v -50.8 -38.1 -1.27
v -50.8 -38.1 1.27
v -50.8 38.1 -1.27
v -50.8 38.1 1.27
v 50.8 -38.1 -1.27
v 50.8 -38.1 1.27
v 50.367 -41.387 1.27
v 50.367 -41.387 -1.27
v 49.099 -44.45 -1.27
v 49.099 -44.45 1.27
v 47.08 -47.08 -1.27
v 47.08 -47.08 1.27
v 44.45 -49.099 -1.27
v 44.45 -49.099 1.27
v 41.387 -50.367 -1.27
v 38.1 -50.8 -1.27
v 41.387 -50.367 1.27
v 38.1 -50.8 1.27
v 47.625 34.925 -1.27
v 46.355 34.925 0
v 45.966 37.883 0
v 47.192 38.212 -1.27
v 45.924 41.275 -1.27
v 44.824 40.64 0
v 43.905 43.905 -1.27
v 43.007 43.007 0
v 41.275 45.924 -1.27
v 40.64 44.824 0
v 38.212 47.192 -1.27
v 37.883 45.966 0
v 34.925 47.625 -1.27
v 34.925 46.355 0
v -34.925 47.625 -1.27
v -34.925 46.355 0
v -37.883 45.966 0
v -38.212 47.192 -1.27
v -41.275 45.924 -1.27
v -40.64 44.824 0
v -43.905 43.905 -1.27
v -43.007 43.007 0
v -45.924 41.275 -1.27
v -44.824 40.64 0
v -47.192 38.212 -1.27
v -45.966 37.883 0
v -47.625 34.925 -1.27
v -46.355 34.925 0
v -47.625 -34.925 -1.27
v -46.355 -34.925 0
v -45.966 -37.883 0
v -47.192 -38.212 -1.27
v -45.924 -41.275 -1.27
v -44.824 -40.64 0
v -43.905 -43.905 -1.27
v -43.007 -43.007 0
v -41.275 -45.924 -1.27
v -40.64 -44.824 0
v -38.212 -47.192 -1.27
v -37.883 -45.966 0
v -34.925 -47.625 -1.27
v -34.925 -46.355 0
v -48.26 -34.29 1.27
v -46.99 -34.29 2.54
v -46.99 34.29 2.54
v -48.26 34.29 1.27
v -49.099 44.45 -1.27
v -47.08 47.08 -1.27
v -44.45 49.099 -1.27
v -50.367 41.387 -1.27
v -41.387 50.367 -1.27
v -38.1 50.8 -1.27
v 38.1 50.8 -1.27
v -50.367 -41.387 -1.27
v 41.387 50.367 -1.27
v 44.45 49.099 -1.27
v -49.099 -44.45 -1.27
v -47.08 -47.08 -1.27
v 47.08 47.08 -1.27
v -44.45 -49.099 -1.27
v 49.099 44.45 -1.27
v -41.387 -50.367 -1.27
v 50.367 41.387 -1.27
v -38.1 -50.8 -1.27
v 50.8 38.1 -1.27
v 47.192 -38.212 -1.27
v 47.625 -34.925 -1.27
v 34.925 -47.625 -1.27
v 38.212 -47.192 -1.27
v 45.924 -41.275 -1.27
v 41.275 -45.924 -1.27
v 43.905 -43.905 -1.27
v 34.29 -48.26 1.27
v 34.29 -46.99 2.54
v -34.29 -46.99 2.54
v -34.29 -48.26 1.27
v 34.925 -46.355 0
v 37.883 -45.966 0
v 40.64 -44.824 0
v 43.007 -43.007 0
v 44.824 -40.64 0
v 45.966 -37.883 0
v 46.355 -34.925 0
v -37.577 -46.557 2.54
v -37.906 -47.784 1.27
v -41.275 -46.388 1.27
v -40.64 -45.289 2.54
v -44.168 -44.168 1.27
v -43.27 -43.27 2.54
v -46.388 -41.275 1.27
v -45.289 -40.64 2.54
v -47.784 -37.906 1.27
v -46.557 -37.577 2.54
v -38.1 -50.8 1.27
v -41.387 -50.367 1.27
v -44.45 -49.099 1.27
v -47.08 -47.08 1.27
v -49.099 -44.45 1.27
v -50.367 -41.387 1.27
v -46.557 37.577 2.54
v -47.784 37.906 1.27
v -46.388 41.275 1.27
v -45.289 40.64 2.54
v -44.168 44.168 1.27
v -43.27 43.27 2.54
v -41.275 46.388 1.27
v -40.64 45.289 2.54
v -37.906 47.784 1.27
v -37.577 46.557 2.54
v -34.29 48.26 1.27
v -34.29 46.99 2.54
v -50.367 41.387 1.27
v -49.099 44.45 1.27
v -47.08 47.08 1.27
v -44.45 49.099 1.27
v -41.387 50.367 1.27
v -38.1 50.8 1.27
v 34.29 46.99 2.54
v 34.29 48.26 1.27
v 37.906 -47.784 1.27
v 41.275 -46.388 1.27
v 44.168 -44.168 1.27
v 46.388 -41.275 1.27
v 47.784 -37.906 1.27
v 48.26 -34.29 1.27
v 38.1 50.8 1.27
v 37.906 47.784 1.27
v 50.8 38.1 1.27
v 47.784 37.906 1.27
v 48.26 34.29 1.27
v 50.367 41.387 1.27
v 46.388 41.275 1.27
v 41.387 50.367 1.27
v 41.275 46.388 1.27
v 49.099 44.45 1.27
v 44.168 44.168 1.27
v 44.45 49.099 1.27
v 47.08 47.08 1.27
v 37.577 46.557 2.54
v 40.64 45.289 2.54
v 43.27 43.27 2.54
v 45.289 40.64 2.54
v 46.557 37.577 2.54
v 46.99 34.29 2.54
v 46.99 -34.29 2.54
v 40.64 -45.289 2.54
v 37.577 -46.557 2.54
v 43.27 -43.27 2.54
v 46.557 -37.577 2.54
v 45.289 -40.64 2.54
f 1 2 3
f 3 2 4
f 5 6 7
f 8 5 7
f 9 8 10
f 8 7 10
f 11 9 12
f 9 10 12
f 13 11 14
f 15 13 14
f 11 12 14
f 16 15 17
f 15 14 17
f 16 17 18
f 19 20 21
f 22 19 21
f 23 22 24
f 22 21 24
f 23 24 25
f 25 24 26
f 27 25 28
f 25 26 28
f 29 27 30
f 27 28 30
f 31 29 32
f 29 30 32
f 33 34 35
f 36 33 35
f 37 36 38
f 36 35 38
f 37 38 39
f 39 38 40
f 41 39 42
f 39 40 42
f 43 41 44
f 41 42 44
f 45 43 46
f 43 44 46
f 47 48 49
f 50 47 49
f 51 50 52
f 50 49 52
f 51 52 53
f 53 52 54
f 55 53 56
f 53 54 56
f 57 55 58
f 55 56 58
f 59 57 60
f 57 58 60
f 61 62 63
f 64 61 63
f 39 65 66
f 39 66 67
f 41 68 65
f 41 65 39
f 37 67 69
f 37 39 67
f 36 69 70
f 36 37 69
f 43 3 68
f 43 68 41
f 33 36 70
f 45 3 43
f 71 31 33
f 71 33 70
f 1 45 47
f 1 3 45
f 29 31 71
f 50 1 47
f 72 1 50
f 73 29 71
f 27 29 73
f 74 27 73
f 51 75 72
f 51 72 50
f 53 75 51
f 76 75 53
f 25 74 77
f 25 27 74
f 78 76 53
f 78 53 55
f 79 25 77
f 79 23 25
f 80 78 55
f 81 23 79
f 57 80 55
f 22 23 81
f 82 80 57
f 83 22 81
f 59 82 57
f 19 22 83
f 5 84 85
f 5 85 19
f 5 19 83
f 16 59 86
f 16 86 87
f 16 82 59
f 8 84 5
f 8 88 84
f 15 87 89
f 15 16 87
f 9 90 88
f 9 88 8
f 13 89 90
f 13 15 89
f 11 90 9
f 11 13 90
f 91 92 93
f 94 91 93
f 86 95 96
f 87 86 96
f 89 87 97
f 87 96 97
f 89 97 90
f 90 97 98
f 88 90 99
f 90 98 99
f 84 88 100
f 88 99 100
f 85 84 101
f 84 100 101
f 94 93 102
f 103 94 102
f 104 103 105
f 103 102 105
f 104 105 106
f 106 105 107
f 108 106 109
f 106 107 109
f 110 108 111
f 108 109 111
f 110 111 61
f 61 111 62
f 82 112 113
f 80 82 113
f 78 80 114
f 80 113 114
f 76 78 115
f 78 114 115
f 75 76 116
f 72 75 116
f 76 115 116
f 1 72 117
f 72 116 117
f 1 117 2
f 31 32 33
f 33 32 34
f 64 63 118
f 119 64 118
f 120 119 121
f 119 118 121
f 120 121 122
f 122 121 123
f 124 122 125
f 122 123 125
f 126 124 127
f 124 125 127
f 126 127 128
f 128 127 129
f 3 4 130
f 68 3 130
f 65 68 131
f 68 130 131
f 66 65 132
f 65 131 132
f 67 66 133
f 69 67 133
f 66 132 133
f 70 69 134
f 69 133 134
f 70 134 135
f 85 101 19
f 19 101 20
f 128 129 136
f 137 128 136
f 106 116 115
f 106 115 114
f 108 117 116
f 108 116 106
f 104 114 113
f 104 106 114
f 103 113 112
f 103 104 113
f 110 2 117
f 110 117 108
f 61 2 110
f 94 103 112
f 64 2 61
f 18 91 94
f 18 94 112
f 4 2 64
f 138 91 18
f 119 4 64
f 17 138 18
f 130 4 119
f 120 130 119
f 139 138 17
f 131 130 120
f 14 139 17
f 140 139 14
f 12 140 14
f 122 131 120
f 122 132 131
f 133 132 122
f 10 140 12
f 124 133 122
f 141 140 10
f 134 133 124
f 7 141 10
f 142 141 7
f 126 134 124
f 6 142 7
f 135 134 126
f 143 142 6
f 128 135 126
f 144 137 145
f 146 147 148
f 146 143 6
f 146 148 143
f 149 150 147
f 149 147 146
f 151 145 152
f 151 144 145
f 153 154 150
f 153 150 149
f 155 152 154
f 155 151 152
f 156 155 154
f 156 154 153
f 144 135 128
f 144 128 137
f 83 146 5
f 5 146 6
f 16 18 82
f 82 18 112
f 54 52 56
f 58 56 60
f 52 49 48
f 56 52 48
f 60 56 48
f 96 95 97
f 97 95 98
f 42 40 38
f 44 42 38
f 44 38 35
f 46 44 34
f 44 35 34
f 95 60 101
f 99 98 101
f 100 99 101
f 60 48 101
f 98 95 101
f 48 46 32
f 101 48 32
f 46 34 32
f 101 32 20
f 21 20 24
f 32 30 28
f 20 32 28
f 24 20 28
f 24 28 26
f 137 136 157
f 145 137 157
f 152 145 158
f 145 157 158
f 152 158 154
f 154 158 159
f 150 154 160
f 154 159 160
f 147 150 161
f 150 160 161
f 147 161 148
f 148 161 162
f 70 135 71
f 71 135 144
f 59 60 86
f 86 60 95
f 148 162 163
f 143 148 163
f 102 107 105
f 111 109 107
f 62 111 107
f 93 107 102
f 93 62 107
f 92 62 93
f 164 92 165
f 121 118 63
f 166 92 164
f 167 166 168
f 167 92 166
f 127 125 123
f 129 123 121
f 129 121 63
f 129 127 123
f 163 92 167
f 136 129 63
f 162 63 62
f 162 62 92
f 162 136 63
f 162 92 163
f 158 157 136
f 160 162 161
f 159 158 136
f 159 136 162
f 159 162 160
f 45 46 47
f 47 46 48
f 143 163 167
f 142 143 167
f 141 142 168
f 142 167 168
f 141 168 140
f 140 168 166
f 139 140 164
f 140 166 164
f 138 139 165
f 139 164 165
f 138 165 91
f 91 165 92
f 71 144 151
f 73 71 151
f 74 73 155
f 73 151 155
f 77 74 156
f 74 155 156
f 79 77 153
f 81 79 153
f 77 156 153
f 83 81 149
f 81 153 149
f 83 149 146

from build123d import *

# Parameters (mm, degrees)
F1_DEPTH = 2.54
F3_DEPTH = 1.27
F5_DEPTH = 1.27
F6_SIZE  = 1.26999
F7_SIZE  = 1.26999


# Not quite as in the source:
# - a fillet or chamfer is up to 0.001 mm smaller than in the source, because OpenCascade refuses the exact size


with BuildPart() as f1:
    # F0 (on Top) → F1 (new body)
    with BuildSketch(Plane.XY):
        with BuildLine():
            ThreePointArc((50.8, 38.1), (47.0802561211, 47.0802561211), (38.1, 50.8))
            Line((38.1, 50.8), (-38.1, 50.8))
            ThreePointArc((-38.1, 50.8), (-47.0802561211, 47.0802561211), (-50.8, 38.1))
            Line((-50.8, 38.1), (-50.8, -38.1))
            ThreePointArc((-50.8, -38.1), (-47.0802561211, -47.0802561211), (-38.1, -50.8))
            Line((-38.1, -50.8), (38.1, -50.8))
            ThreePointArc((38.1, -50.8), (47.0802561211, -47.0802561211), (50.8, -38.1))
            Line((50.8, -38.1), (50.8, 38.1))
        make_face()
    extrude(amount=F1_DEPTH)

    # F2 (on face) → F3 (join)
    with BuildSketch(Plane(origin=(0, 0, 0), x_dir=(1, 0, 0), z_dir=(0, 0, -1))):
        with BuildLine():
            Line((-38.1, -50.8), (38.1, -50.8))
            ThreePointArc((38.1, -50.8), (47.0802561211, -47.0802561211), (50.8, -38.1))
            Line((50.8, -38.1), (50.8, 38.1))
            ThreePointArc((50.8, 38.1), (47.0802561211, 47.0802561211), (38.1, 50.8))
            Line((38.1, 50.8), (-38.1, 50.8))
            ThreePointArc((-38.1, 50.8), (-47.0802561211, 47.0802561211), (-50.8, 38.1))
            Line((-50.8, 38.1), (-50.8, -38.1))
            ThreePointArc((-50.8, -38.1), (-47.0802561211, -47.0802561211), (-38.1, -50.8))
        make_face()
        with BuildLine():
            Line((-34.925, 47.625), (34.925, 47.625))
            ThreePointArc((34.925, 47.625), (43.9052561211, 43.9052561211), (47.625, 34.925))
            Line((47.625, 34.925), (47.625, -34.925))
            ThreePointArc((47.625, -34.925), (43.9052561211, -43.9052561211), (34.925, -47.625))
            Line((34.925, -47.625), (-34.925, -47.625))
            ThreePointArc((-34.925, -47.625), (-43.9052561211, -43.9052561211), (-47.625, -34.925))
            Line((-47.625, -34.925), (-47.625, 34.925))
            ThreePointArc((-47.625, 34.925), (-43.9052561211, 43.9052561211), (-34.925, 47.625))
        make_face(mode=Mode.SUBTRACT)
    extrude(amount=F3_DEPTH)

    # F4 (on face) → F5 (cut)
    with BuildSketch(Plane.XY.offset(2.54)):
        with BuildLine():
            Line((50.8, -38.1), (50.8, 38.1))
            ThreePointArc((50.8, 38.1), (47.0802561211, 47.0802561211), (38.1, 50.8))
            Line((38.1, 50.8), (-38.1, 50.8))
            ThreePointArc((-38.1, 50.8), (-47.0802561211, 47.0802561211), (-50.8, 38.1))
            Line((-50.8, 38.1), (-50.8, -38.1))
            ThreePointArc((-50.8, -38.1), (-47.0802561211, -47.0802561211), (-38.1, -50.8))
            Line((-38.1, -50.8), (38.1, -50.8))
            ThreePointArc((38.1, -50.8), (47.0802561211, -47.0802561211), (50.8, -38.1))
        make_face()
        with BuildLine():
            ThreePointArc((46.99, -34.29), (43.2702561211, -43.2702561211), (34.29, -46.99))
            Line((34.29, -46.99), (-34.29, -46.99))
            ThreePointArc((-34.29, -46.99), (-43.2702561211, -43.2702561211), (-46.99, -34.29))
            Line((-46.99, -34.29), (-46.99, 34.29))
            ThreePointArc((-46.99, 34.29), (-43.2702561211, 43.2702561211), (-34.29, 46.99))
            Line((-34.29, 46.99), (34.29, 46.99))
            ThreePointArc((34.29, 46.99), (43.2702561211, 43.2702561211), (46.99, 34.29))
            Line((46.99, 34.29), (46.99, -34.29))
        make_face(mode=Mode.SUBTRACT)
    extrude(amount=-F5_DEPTH, mode=Mode.SUBTRACT)

    # F6 (size 1.27 in the source; OpenCascade refuses exactly that, so slightly less here)
    f6_edges = [f1.edges().sort_by_distance(p)[0] for p in [
        (0, 46.99, 1.27),
        (-43.270256, 43.270256, 1.27),
        (-46.99, 0, 1.27),
        (-43.270256, -43.270256, 1.27),
    ]]
    chamfer(f6_edges, length=F6_SIZE)

    # F7 (size 1.27 in the source; OpenCascade refuses exactly that, so slightly less here)
    f7_edges = [f1.edges().sort_by_distance(p)[0] for p in [
        (-43.905256, -43.905256, 0),
        (-47.625, 0, 0),
        (-43.905256, 43.905256, 0),
        (0, 47.625, 0),
        (43.905256, 43.905256, 0),
        (47.625, 0, 0),
        (43.905256, -43.905256, 0),
        (0, -47.625, 0),
    ]]
    chamfer(f7_edges, length=F7_SIZE)


solid = f1.part
